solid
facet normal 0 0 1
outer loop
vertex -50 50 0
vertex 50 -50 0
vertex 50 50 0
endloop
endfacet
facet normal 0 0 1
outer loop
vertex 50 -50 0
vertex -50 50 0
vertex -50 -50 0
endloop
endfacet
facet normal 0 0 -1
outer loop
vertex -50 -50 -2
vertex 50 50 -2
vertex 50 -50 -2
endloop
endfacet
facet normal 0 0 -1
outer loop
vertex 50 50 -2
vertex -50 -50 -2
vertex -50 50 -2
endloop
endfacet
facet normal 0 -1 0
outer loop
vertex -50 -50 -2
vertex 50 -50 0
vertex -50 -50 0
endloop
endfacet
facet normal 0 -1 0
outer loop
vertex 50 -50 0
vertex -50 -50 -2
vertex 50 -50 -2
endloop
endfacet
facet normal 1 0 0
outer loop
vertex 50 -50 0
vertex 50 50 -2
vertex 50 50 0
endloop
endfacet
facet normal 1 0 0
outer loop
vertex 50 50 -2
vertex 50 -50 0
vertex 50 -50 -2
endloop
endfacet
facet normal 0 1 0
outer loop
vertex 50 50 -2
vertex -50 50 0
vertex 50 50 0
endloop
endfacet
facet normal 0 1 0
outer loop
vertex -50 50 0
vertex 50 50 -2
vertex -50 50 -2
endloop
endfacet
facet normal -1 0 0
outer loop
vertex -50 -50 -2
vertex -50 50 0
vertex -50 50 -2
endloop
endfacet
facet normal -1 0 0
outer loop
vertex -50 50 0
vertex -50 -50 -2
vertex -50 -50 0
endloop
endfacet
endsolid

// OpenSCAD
// Production geometry for the NNLCI POI animation. Units are display units.
// Both LF planes use this SAME 100 x 100 slab and 20 x 20 patch frame.
// Python highlights exactly nine aligned stencil locations on either mesh.
// Native CFD spacing appears only in the underlying field texture.
// Export each part as OFF; the CPU compositor projects the actual CAD meshes.
part = "plane";
$fn = 20;

if (part == "plane")
    translate([-50, -50, -2]) cube([100, 100, 2]);
else if (part == "patch")
    translate([0, 0, 0.35]) linear_extrude(height=0.5)
        difference() {
            square([21, 21], center=true);
            square([20, 20], center=true);
        }
else if (part == "sample")
    cylinder(h=0.55, r=0.65, $fn=12);
else if (part == "pin")
    union() {
        cylinder(h=9, r1=0, r2=3.4);
        translate([0, 0, 10]) sphere(r=4.4);
    }
else
    assert(false, "Unknown part");
